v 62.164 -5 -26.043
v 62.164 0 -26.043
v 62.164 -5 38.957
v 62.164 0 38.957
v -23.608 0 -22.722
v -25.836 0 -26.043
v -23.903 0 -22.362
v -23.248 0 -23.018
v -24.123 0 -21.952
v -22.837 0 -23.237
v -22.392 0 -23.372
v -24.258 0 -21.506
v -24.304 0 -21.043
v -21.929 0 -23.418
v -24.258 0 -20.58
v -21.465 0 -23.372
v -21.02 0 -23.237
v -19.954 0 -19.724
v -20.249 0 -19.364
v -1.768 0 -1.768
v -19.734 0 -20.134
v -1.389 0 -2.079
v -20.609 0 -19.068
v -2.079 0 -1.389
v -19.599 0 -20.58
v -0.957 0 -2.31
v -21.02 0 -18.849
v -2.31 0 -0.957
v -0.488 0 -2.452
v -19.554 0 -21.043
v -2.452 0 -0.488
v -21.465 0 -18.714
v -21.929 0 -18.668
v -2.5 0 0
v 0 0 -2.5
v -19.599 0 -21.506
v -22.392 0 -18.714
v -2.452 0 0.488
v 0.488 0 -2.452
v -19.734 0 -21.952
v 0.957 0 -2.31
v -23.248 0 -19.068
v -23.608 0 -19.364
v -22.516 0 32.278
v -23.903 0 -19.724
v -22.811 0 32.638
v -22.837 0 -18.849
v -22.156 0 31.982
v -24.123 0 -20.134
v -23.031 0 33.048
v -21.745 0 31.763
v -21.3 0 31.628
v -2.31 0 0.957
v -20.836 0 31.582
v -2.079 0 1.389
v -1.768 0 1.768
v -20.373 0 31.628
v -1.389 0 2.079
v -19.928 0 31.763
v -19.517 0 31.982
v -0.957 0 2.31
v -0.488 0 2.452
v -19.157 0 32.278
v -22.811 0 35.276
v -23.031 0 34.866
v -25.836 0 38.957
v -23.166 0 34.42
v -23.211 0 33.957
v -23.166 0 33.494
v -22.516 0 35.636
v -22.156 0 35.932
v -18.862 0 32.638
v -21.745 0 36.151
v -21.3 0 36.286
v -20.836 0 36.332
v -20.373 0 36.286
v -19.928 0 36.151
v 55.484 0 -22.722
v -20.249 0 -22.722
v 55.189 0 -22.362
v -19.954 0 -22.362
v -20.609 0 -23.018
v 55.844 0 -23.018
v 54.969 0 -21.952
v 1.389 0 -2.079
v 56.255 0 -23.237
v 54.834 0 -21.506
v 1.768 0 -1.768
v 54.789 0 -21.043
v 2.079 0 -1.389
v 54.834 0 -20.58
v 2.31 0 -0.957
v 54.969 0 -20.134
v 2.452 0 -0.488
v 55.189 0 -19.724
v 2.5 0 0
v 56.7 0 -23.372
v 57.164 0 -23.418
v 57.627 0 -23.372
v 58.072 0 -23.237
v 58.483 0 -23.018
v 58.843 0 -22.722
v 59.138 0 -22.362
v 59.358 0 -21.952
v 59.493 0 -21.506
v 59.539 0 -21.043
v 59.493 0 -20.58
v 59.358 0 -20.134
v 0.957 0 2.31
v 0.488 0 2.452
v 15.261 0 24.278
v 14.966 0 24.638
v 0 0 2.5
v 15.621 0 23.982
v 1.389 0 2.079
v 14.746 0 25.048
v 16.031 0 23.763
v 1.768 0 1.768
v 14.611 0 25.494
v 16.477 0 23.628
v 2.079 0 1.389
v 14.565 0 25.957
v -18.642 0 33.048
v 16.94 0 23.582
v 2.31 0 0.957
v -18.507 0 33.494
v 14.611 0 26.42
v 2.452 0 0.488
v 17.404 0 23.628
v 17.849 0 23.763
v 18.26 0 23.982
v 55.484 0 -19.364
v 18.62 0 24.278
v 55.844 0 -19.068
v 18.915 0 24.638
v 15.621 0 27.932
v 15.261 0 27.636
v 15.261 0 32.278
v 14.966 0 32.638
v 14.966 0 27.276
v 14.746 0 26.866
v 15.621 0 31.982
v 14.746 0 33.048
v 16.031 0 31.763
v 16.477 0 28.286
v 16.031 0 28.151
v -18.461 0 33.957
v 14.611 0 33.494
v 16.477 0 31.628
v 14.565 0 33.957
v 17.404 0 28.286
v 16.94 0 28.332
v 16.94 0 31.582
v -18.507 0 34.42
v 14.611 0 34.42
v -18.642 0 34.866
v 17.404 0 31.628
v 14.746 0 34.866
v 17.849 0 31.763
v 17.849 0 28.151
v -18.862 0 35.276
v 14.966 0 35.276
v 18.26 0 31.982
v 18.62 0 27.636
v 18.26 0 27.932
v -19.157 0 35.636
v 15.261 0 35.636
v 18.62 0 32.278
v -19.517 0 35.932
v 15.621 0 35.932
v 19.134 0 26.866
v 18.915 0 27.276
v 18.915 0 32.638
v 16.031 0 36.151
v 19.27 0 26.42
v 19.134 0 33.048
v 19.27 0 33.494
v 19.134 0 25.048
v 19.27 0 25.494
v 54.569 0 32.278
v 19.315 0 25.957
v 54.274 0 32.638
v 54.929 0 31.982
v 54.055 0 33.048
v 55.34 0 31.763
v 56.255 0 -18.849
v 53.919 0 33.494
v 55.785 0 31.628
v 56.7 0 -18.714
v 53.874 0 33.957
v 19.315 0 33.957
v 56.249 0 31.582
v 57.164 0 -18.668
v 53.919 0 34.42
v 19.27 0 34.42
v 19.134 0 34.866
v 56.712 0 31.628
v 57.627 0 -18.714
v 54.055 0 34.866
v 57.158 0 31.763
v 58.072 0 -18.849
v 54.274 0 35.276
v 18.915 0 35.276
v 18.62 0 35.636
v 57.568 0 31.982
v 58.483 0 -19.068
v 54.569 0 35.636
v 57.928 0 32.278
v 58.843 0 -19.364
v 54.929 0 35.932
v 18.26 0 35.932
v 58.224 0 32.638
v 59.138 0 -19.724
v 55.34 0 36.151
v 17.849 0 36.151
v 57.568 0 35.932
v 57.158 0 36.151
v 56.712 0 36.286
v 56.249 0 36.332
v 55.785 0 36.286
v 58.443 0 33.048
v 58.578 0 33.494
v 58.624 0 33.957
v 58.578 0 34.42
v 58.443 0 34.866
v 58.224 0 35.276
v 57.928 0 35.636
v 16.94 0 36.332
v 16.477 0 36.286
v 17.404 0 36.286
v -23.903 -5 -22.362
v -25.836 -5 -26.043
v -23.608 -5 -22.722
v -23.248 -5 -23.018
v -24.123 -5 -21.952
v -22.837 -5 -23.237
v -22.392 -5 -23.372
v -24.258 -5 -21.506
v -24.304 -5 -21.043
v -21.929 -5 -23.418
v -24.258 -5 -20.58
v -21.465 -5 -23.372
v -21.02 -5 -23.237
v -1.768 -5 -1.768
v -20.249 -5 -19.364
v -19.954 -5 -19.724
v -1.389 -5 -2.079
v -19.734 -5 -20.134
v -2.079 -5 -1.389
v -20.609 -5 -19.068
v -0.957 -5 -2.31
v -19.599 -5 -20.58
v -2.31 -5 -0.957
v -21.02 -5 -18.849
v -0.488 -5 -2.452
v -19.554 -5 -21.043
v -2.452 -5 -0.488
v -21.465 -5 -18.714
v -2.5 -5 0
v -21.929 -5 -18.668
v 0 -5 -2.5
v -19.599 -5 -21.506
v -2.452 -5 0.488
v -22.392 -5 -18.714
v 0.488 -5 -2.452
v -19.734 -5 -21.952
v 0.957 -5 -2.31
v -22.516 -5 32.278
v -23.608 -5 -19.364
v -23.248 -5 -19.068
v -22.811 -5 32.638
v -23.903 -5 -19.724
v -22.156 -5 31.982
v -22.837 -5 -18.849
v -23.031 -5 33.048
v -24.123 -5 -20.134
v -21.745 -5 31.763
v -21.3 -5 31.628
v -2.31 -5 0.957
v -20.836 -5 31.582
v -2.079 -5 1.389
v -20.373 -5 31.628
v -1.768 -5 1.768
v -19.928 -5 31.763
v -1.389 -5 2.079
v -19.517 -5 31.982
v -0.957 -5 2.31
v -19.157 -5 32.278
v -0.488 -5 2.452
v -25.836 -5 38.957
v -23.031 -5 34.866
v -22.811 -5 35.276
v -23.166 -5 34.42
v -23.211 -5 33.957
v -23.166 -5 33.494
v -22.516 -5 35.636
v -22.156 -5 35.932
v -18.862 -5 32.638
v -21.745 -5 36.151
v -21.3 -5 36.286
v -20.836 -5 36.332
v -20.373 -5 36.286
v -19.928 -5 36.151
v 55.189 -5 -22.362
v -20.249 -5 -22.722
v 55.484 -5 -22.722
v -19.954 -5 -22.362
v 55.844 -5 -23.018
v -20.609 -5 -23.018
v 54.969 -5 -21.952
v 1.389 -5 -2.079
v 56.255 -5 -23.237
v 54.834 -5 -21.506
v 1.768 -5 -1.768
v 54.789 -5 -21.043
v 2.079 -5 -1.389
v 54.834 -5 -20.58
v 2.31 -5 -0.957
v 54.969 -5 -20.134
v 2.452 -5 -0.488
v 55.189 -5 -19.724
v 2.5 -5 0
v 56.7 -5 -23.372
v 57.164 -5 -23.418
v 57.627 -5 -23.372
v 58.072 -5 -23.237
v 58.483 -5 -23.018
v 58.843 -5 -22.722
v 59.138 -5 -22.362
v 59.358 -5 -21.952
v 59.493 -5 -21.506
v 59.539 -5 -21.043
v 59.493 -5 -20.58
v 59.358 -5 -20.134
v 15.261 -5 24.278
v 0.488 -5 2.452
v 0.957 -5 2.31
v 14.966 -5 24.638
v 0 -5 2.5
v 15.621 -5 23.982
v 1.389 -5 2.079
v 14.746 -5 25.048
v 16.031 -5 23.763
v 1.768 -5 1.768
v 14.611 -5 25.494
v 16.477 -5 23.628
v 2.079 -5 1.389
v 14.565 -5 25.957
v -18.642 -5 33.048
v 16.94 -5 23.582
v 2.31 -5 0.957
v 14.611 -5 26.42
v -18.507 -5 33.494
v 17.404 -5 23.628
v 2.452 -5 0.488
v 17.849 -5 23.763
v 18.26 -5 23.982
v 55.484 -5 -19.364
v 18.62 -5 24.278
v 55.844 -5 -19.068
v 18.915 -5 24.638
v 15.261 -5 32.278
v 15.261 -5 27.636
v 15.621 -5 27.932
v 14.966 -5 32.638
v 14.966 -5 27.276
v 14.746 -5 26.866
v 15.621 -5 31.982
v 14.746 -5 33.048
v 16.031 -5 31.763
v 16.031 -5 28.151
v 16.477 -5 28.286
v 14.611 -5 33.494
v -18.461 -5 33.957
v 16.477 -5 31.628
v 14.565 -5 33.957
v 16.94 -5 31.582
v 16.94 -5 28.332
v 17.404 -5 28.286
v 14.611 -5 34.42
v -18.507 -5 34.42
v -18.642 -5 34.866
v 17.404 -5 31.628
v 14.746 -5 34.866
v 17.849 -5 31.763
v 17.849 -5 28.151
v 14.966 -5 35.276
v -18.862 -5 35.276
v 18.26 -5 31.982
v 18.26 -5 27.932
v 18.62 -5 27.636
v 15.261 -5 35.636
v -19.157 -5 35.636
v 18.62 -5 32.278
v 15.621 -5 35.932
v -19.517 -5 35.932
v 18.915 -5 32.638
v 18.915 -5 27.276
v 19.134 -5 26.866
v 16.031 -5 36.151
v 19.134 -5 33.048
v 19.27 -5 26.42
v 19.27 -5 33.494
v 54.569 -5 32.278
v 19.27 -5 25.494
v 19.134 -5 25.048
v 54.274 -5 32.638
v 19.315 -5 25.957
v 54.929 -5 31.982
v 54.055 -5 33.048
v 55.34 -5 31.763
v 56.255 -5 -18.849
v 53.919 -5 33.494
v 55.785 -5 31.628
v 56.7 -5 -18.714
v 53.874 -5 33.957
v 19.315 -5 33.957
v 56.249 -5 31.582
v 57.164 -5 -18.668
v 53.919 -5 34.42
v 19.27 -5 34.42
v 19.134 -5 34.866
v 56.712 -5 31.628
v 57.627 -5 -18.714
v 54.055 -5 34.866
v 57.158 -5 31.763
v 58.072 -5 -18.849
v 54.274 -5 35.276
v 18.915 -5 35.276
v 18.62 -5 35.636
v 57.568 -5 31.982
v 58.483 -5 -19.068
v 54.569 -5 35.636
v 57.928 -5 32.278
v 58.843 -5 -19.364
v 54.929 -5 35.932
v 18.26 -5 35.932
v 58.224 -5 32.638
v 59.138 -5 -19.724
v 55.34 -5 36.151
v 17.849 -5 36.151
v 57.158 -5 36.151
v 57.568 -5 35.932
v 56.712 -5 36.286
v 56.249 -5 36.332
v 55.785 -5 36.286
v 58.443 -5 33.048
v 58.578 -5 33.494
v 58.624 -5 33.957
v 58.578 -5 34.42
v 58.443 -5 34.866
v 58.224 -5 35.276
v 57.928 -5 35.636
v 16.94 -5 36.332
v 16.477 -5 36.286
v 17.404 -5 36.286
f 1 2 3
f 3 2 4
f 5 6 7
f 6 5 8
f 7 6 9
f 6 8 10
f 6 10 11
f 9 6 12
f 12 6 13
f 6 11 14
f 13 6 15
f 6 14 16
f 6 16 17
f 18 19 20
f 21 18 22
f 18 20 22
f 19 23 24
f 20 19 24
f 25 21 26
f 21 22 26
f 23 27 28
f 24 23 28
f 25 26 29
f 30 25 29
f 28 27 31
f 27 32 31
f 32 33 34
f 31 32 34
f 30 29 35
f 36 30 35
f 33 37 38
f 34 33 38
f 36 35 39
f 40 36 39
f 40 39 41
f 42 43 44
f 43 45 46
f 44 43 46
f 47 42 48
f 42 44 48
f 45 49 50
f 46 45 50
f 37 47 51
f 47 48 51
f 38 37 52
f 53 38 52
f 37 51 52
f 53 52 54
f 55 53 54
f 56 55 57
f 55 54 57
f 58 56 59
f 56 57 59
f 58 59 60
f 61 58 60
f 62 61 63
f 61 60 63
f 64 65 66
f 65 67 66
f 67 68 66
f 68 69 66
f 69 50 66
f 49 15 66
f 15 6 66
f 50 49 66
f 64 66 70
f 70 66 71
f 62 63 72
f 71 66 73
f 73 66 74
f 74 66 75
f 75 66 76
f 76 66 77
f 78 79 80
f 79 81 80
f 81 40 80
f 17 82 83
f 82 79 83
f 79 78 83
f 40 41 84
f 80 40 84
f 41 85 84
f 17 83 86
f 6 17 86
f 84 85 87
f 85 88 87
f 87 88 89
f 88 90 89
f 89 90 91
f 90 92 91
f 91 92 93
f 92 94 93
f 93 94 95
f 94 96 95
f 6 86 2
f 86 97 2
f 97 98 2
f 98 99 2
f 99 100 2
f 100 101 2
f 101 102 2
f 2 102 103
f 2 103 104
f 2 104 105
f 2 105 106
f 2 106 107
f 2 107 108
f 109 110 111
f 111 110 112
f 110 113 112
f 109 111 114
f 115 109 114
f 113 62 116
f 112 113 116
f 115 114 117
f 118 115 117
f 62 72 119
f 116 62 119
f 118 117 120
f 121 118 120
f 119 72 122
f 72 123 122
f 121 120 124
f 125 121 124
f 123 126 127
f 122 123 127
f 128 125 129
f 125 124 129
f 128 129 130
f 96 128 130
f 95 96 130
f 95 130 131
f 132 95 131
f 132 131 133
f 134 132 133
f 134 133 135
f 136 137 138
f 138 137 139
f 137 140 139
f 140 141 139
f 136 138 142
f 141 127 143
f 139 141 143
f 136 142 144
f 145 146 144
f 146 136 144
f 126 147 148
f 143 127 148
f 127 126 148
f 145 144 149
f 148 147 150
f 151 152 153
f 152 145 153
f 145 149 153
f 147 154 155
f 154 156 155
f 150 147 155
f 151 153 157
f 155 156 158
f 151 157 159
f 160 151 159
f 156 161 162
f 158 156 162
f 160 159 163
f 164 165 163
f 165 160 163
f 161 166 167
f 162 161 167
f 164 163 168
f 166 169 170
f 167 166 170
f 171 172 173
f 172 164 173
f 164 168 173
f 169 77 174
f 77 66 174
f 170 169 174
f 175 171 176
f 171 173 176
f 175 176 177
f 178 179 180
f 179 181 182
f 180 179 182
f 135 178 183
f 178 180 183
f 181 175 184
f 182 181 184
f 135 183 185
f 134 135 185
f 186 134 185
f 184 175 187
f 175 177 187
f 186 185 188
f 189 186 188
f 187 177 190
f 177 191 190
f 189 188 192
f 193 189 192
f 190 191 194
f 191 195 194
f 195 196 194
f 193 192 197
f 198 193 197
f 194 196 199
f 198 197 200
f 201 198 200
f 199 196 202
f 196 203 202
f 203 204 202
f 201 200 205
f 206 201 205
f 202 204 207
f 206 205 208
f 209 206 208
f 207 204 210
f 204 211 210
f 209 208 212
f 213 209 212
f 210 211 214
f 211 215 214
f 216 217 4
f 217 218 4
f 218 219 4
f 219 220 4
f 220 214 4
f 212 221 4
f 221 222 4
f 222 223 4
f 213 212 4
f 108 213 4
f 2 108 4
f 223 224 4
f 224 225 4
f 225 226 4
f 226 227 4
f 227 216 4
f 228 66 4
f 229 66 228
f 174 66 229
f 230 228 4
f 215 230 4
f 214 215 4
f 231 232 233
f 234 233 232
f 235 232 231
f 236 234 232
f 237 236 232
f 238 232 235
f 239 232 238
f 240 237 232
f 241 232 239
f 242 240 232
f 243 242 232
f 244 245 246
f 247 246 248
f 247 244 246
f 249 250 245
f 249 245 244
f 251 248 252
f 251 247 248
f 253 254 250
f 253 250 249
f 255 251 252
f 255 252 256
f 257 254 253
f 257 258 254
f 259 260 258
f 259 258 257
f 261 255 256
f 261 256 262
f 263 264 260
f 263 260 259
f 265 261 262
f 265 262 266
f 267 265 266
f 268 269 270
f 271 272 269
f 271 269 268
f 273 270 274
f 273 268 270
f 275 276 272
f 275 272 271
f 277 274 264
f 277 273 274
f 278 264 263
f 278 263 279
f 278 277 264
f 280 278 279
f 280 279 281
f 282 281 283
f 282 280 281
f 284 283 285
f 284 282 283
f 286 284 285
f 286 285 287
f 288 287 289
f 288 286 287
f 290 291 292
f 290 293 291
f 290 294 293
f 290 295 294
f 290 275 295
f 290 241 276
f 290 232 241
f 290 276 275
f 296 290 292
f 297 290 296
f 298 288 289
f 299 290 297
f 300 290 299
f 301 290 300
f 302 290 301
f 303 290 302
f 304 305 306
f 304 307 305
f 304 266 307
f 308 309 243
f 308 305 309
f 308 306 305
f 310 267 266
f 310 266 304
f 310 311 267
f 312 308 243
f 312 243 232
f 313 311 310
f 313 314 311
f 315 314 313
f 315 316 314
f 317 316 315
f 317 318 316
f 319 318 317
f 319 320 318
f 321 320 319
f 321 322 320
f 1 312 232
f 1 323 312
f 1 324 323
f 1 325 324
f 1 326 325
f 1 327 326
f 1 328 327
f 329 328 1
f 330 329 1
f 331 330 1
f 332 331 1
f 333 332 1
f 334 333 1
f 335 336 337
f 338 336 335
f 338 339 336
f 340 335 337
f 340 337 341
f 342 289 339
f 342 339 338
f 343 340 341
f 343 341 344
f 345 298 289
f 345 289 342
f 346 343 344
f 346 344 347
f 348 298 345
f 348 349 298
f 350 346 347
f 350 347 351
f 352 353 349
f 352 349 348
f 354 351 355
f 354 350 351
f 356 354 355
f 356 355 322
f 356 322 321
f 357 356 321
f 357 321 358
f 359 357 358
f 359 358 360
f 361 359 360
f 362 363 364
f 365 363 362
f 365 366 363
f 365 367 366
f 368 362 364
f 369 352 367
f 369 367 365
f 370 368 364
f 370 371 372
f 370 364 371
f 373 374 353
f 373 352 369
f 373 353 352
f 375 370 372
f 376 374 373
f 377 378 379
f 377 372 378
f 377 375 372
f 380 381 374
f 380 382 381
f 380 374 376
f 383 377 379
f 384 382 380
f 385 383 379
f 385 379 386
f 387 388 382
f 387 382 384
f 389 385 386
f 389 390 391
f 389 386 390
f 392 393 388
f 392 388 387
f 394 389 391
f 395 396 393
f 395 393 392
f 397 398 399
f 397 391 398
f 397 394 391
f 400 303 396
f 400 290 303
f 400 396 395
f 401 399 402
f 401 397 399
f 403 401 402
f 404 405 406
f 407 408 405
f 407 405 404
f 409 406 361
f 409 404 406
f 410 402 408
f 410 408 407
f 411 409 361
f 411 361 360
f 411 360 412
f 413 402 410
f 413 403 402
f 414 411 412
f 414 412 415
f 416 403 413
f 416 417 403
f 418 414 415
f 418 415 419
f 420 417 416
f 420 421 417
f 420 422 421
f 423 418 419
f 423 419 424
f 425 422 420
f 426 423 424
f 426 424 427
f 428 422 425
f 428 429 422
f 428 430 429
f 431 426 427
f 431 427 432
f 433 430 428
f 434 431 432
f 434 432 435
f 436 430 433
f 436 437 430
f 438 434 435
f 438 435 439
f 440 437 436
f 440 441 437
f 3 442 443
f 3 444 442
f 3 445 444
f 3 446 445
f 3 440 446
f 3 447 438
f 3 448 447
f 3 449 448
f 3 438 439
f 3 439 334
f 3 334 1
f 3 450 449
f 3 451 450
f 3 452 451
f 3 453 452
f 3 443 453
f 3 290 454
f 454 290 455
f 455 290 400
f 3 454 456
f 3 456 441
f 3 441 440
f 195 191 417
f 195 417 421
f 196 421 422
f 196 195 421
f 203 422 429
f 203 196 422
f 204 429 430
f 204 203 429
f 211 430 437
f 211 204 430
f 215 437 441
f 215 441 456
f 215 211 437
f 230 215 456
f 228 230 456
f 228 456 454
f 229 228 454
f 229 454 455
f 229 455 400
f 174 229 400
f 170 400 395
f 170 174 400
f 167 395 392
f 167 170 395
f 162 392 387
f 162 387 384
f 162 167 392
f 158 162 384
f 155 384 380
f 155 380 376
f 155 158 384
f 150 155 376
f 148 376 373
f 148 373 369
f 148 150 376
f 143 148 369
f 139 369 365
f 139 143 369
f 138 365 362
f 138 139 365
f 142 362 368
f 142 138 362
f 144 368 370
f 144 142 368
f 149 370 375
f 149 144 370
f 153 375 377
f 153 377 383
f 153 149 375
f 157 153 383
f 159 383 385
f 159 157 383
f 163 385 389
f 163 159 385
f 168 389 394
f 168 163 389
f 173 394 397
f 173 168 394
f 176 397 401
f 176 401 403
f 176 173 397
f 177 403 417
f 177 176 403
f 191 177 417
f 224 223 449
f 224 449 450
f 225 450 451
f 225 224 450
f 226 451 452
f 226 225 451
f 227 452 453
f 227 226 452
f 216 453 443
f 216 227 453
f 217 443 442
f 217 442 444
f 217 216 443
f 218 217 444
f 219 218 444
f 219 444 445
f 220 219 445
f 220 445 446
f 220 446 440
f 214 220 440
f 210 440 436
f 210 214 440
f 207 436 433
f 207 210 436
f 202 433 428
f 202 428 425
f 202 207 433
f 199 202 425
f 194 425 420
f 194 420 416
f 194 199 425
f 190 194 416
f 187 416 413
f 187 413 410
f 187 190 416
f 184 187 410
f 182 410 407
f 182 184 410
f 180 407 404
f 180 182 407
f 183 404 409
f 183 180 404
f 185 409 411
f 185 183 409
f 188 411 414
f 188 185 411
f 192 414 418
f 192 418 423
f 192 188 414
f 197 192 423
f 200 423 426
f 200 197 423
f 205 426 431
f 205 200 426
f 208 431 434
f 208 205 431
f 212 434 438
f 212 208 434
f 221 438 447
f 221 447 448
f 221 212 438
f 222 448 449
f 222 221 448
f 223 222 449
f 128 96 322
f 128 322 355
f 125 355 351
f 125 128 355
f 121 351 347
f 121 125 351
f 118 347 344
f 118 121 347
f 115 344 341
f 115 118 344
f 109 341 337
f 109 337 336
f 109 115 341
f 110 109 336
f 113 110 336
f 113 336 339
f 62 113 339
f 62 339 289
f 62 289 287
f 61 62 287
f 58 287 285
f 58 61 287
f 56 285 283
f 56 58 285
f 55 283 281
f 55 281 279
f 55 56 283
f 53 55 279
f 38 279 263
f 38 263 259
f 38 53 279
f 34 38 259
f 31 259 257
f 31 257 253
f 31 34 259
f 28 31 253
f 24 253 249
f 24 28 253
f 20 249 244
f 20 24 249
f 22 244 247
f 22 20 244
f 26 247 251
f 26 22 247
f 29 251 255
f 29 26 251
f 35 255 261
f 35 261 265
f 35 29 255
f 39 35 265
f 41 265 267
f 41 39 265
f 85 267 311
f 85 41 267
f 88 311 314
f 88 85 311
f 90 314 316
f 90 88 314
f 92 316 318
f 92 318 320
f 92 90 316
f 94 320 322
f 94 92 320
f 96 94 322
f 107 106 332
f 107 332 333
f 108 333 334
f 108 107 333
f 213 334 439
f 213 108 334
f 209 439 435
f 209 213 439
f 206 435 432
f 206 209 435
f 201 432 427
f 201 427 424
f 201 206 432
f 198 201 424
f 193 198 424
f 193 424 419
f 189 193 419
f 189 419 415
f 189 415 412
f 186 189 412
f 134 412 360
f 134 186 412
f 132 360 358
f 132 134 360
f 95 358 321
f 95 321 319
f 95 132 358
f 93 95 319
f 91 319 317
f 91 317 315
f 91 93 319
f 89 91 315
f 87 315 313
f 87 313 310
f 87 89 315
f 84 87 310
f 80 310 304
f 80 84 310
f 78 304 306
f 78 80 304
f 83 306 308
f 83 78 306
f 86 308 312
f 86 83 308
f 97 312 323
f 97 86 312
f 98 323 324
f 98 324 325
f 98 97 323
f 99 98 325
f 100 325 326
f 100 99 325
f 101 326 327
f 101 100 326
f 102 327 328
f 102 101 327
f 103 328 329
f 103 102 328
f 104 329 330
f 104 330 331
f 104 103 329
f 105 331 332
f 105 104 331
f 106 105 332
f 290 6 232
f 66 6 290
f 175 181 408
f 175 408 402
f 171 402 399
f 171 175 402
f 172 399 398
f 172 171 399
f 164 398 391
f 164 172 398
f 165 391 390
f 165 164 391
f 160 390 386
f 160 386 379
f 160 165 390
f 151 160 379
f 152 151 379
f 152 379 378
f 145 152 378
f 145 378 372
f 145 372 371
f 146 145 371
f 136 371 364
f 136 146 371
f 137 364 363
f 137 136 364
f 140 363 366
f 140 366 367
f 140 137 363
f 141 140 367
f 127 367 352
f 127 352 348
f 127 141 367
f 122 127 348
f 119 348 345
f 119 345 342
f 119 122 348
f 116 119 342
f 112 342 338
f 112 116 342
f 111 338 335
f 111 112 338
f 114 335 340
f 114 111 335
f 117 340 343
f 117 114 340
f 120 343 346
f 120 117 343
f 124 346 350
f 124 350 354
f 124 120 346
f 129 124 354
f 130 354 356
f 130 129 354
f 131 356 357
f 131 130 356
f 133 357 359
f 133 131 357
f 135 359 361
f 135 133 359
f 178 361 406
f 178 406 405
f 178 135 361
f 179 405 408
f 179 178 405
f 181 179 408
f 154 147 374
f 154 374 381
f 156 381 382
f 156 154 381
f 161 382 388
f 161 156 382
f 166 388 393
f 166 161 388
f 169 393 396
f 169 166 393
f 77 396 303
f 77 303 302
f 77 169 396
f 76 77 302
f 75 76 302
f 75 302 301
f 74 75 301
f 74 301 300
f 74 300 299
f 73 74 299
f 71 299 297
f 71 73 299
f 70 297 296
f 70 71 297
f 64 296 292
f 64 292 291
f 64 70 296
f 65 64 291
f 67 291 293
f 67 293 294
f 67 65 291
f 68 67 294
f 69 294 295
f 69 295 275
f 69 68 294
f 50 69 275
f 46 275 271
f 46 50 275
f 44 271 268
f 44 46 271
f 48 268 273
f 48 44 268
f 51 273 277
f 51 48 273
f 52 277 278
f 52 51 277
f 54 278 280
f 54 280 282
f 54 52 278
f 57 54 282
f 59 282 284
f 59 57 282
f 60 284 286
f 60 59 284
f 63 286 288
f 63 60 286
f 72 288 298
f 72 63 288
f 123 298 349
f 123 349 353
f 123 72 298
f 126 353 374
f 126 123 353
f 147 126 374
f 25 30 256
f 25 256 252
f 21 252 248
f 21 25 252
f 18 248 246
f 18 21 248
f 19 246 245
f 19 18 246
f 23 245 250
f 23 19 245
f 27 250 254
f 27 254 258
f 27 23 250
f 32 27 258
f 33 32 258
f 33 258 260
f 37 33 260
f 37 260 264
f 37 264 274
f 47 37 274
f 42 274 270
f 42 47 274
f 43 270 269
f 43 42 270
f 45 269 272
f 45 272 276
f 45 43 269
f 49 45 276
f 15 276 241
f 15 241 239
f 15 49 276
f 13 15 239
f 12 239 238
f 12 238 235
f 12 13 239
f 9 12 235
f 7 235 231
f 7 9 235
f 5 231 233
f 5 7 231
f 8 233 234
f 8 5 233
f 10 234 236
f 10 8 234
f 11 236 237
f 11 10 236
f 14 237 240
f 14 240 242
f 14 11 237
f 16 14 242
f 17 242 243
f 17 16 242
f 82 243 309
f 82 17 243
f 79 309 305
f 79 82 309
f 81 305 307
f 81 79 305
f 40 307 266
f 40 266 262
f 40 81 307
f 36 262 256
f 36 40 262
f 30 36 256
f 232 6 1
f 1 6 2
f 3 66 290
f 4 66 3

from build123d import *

# Parameters (mm, degrees)
F2_W     = 88
F2_H     = 65
F2_R     = 2.375
F2_R_2   = 2.5
F3_DEPTH = 5


with BuildPart() as f3:
    # F2 (on Front) → F3 (new body)
    with BuildSketch(Plane.XZ):
        with Locations((18.163575, 6.457009)):
            Rectangle(F2_W, F2_H)
        with Locations((-21.928577, -21.042991)):
            Circle(F2_R, mode=Mode.SUBTRACT)
        Circle(F2_R_2, mode=Mode.SUBTRACT)
        with Locations((57.163575, -21.042991)):
            Circle(F2_R, mode=Mode.SUBTRACT)
        with Locations((-20.836425, 33.957009)):
            Circle(F2_R, mode=Mode.SUBTRACT)
        with Locations((16.940257, 25.957009)):
            Circle(F2_R, mode=Mode.SUBTRACT)
        with Locations((16.940257, 33.957009)):
            Circle(F2_R, mode=Mode.SUBTRACT)
        with Locations((56.248803, 33.957009)):
            Circle(F2_R, mode=Mode.SUBTRACT)
    extrude(amount=F3_DEPTH)


solid = f3.part
